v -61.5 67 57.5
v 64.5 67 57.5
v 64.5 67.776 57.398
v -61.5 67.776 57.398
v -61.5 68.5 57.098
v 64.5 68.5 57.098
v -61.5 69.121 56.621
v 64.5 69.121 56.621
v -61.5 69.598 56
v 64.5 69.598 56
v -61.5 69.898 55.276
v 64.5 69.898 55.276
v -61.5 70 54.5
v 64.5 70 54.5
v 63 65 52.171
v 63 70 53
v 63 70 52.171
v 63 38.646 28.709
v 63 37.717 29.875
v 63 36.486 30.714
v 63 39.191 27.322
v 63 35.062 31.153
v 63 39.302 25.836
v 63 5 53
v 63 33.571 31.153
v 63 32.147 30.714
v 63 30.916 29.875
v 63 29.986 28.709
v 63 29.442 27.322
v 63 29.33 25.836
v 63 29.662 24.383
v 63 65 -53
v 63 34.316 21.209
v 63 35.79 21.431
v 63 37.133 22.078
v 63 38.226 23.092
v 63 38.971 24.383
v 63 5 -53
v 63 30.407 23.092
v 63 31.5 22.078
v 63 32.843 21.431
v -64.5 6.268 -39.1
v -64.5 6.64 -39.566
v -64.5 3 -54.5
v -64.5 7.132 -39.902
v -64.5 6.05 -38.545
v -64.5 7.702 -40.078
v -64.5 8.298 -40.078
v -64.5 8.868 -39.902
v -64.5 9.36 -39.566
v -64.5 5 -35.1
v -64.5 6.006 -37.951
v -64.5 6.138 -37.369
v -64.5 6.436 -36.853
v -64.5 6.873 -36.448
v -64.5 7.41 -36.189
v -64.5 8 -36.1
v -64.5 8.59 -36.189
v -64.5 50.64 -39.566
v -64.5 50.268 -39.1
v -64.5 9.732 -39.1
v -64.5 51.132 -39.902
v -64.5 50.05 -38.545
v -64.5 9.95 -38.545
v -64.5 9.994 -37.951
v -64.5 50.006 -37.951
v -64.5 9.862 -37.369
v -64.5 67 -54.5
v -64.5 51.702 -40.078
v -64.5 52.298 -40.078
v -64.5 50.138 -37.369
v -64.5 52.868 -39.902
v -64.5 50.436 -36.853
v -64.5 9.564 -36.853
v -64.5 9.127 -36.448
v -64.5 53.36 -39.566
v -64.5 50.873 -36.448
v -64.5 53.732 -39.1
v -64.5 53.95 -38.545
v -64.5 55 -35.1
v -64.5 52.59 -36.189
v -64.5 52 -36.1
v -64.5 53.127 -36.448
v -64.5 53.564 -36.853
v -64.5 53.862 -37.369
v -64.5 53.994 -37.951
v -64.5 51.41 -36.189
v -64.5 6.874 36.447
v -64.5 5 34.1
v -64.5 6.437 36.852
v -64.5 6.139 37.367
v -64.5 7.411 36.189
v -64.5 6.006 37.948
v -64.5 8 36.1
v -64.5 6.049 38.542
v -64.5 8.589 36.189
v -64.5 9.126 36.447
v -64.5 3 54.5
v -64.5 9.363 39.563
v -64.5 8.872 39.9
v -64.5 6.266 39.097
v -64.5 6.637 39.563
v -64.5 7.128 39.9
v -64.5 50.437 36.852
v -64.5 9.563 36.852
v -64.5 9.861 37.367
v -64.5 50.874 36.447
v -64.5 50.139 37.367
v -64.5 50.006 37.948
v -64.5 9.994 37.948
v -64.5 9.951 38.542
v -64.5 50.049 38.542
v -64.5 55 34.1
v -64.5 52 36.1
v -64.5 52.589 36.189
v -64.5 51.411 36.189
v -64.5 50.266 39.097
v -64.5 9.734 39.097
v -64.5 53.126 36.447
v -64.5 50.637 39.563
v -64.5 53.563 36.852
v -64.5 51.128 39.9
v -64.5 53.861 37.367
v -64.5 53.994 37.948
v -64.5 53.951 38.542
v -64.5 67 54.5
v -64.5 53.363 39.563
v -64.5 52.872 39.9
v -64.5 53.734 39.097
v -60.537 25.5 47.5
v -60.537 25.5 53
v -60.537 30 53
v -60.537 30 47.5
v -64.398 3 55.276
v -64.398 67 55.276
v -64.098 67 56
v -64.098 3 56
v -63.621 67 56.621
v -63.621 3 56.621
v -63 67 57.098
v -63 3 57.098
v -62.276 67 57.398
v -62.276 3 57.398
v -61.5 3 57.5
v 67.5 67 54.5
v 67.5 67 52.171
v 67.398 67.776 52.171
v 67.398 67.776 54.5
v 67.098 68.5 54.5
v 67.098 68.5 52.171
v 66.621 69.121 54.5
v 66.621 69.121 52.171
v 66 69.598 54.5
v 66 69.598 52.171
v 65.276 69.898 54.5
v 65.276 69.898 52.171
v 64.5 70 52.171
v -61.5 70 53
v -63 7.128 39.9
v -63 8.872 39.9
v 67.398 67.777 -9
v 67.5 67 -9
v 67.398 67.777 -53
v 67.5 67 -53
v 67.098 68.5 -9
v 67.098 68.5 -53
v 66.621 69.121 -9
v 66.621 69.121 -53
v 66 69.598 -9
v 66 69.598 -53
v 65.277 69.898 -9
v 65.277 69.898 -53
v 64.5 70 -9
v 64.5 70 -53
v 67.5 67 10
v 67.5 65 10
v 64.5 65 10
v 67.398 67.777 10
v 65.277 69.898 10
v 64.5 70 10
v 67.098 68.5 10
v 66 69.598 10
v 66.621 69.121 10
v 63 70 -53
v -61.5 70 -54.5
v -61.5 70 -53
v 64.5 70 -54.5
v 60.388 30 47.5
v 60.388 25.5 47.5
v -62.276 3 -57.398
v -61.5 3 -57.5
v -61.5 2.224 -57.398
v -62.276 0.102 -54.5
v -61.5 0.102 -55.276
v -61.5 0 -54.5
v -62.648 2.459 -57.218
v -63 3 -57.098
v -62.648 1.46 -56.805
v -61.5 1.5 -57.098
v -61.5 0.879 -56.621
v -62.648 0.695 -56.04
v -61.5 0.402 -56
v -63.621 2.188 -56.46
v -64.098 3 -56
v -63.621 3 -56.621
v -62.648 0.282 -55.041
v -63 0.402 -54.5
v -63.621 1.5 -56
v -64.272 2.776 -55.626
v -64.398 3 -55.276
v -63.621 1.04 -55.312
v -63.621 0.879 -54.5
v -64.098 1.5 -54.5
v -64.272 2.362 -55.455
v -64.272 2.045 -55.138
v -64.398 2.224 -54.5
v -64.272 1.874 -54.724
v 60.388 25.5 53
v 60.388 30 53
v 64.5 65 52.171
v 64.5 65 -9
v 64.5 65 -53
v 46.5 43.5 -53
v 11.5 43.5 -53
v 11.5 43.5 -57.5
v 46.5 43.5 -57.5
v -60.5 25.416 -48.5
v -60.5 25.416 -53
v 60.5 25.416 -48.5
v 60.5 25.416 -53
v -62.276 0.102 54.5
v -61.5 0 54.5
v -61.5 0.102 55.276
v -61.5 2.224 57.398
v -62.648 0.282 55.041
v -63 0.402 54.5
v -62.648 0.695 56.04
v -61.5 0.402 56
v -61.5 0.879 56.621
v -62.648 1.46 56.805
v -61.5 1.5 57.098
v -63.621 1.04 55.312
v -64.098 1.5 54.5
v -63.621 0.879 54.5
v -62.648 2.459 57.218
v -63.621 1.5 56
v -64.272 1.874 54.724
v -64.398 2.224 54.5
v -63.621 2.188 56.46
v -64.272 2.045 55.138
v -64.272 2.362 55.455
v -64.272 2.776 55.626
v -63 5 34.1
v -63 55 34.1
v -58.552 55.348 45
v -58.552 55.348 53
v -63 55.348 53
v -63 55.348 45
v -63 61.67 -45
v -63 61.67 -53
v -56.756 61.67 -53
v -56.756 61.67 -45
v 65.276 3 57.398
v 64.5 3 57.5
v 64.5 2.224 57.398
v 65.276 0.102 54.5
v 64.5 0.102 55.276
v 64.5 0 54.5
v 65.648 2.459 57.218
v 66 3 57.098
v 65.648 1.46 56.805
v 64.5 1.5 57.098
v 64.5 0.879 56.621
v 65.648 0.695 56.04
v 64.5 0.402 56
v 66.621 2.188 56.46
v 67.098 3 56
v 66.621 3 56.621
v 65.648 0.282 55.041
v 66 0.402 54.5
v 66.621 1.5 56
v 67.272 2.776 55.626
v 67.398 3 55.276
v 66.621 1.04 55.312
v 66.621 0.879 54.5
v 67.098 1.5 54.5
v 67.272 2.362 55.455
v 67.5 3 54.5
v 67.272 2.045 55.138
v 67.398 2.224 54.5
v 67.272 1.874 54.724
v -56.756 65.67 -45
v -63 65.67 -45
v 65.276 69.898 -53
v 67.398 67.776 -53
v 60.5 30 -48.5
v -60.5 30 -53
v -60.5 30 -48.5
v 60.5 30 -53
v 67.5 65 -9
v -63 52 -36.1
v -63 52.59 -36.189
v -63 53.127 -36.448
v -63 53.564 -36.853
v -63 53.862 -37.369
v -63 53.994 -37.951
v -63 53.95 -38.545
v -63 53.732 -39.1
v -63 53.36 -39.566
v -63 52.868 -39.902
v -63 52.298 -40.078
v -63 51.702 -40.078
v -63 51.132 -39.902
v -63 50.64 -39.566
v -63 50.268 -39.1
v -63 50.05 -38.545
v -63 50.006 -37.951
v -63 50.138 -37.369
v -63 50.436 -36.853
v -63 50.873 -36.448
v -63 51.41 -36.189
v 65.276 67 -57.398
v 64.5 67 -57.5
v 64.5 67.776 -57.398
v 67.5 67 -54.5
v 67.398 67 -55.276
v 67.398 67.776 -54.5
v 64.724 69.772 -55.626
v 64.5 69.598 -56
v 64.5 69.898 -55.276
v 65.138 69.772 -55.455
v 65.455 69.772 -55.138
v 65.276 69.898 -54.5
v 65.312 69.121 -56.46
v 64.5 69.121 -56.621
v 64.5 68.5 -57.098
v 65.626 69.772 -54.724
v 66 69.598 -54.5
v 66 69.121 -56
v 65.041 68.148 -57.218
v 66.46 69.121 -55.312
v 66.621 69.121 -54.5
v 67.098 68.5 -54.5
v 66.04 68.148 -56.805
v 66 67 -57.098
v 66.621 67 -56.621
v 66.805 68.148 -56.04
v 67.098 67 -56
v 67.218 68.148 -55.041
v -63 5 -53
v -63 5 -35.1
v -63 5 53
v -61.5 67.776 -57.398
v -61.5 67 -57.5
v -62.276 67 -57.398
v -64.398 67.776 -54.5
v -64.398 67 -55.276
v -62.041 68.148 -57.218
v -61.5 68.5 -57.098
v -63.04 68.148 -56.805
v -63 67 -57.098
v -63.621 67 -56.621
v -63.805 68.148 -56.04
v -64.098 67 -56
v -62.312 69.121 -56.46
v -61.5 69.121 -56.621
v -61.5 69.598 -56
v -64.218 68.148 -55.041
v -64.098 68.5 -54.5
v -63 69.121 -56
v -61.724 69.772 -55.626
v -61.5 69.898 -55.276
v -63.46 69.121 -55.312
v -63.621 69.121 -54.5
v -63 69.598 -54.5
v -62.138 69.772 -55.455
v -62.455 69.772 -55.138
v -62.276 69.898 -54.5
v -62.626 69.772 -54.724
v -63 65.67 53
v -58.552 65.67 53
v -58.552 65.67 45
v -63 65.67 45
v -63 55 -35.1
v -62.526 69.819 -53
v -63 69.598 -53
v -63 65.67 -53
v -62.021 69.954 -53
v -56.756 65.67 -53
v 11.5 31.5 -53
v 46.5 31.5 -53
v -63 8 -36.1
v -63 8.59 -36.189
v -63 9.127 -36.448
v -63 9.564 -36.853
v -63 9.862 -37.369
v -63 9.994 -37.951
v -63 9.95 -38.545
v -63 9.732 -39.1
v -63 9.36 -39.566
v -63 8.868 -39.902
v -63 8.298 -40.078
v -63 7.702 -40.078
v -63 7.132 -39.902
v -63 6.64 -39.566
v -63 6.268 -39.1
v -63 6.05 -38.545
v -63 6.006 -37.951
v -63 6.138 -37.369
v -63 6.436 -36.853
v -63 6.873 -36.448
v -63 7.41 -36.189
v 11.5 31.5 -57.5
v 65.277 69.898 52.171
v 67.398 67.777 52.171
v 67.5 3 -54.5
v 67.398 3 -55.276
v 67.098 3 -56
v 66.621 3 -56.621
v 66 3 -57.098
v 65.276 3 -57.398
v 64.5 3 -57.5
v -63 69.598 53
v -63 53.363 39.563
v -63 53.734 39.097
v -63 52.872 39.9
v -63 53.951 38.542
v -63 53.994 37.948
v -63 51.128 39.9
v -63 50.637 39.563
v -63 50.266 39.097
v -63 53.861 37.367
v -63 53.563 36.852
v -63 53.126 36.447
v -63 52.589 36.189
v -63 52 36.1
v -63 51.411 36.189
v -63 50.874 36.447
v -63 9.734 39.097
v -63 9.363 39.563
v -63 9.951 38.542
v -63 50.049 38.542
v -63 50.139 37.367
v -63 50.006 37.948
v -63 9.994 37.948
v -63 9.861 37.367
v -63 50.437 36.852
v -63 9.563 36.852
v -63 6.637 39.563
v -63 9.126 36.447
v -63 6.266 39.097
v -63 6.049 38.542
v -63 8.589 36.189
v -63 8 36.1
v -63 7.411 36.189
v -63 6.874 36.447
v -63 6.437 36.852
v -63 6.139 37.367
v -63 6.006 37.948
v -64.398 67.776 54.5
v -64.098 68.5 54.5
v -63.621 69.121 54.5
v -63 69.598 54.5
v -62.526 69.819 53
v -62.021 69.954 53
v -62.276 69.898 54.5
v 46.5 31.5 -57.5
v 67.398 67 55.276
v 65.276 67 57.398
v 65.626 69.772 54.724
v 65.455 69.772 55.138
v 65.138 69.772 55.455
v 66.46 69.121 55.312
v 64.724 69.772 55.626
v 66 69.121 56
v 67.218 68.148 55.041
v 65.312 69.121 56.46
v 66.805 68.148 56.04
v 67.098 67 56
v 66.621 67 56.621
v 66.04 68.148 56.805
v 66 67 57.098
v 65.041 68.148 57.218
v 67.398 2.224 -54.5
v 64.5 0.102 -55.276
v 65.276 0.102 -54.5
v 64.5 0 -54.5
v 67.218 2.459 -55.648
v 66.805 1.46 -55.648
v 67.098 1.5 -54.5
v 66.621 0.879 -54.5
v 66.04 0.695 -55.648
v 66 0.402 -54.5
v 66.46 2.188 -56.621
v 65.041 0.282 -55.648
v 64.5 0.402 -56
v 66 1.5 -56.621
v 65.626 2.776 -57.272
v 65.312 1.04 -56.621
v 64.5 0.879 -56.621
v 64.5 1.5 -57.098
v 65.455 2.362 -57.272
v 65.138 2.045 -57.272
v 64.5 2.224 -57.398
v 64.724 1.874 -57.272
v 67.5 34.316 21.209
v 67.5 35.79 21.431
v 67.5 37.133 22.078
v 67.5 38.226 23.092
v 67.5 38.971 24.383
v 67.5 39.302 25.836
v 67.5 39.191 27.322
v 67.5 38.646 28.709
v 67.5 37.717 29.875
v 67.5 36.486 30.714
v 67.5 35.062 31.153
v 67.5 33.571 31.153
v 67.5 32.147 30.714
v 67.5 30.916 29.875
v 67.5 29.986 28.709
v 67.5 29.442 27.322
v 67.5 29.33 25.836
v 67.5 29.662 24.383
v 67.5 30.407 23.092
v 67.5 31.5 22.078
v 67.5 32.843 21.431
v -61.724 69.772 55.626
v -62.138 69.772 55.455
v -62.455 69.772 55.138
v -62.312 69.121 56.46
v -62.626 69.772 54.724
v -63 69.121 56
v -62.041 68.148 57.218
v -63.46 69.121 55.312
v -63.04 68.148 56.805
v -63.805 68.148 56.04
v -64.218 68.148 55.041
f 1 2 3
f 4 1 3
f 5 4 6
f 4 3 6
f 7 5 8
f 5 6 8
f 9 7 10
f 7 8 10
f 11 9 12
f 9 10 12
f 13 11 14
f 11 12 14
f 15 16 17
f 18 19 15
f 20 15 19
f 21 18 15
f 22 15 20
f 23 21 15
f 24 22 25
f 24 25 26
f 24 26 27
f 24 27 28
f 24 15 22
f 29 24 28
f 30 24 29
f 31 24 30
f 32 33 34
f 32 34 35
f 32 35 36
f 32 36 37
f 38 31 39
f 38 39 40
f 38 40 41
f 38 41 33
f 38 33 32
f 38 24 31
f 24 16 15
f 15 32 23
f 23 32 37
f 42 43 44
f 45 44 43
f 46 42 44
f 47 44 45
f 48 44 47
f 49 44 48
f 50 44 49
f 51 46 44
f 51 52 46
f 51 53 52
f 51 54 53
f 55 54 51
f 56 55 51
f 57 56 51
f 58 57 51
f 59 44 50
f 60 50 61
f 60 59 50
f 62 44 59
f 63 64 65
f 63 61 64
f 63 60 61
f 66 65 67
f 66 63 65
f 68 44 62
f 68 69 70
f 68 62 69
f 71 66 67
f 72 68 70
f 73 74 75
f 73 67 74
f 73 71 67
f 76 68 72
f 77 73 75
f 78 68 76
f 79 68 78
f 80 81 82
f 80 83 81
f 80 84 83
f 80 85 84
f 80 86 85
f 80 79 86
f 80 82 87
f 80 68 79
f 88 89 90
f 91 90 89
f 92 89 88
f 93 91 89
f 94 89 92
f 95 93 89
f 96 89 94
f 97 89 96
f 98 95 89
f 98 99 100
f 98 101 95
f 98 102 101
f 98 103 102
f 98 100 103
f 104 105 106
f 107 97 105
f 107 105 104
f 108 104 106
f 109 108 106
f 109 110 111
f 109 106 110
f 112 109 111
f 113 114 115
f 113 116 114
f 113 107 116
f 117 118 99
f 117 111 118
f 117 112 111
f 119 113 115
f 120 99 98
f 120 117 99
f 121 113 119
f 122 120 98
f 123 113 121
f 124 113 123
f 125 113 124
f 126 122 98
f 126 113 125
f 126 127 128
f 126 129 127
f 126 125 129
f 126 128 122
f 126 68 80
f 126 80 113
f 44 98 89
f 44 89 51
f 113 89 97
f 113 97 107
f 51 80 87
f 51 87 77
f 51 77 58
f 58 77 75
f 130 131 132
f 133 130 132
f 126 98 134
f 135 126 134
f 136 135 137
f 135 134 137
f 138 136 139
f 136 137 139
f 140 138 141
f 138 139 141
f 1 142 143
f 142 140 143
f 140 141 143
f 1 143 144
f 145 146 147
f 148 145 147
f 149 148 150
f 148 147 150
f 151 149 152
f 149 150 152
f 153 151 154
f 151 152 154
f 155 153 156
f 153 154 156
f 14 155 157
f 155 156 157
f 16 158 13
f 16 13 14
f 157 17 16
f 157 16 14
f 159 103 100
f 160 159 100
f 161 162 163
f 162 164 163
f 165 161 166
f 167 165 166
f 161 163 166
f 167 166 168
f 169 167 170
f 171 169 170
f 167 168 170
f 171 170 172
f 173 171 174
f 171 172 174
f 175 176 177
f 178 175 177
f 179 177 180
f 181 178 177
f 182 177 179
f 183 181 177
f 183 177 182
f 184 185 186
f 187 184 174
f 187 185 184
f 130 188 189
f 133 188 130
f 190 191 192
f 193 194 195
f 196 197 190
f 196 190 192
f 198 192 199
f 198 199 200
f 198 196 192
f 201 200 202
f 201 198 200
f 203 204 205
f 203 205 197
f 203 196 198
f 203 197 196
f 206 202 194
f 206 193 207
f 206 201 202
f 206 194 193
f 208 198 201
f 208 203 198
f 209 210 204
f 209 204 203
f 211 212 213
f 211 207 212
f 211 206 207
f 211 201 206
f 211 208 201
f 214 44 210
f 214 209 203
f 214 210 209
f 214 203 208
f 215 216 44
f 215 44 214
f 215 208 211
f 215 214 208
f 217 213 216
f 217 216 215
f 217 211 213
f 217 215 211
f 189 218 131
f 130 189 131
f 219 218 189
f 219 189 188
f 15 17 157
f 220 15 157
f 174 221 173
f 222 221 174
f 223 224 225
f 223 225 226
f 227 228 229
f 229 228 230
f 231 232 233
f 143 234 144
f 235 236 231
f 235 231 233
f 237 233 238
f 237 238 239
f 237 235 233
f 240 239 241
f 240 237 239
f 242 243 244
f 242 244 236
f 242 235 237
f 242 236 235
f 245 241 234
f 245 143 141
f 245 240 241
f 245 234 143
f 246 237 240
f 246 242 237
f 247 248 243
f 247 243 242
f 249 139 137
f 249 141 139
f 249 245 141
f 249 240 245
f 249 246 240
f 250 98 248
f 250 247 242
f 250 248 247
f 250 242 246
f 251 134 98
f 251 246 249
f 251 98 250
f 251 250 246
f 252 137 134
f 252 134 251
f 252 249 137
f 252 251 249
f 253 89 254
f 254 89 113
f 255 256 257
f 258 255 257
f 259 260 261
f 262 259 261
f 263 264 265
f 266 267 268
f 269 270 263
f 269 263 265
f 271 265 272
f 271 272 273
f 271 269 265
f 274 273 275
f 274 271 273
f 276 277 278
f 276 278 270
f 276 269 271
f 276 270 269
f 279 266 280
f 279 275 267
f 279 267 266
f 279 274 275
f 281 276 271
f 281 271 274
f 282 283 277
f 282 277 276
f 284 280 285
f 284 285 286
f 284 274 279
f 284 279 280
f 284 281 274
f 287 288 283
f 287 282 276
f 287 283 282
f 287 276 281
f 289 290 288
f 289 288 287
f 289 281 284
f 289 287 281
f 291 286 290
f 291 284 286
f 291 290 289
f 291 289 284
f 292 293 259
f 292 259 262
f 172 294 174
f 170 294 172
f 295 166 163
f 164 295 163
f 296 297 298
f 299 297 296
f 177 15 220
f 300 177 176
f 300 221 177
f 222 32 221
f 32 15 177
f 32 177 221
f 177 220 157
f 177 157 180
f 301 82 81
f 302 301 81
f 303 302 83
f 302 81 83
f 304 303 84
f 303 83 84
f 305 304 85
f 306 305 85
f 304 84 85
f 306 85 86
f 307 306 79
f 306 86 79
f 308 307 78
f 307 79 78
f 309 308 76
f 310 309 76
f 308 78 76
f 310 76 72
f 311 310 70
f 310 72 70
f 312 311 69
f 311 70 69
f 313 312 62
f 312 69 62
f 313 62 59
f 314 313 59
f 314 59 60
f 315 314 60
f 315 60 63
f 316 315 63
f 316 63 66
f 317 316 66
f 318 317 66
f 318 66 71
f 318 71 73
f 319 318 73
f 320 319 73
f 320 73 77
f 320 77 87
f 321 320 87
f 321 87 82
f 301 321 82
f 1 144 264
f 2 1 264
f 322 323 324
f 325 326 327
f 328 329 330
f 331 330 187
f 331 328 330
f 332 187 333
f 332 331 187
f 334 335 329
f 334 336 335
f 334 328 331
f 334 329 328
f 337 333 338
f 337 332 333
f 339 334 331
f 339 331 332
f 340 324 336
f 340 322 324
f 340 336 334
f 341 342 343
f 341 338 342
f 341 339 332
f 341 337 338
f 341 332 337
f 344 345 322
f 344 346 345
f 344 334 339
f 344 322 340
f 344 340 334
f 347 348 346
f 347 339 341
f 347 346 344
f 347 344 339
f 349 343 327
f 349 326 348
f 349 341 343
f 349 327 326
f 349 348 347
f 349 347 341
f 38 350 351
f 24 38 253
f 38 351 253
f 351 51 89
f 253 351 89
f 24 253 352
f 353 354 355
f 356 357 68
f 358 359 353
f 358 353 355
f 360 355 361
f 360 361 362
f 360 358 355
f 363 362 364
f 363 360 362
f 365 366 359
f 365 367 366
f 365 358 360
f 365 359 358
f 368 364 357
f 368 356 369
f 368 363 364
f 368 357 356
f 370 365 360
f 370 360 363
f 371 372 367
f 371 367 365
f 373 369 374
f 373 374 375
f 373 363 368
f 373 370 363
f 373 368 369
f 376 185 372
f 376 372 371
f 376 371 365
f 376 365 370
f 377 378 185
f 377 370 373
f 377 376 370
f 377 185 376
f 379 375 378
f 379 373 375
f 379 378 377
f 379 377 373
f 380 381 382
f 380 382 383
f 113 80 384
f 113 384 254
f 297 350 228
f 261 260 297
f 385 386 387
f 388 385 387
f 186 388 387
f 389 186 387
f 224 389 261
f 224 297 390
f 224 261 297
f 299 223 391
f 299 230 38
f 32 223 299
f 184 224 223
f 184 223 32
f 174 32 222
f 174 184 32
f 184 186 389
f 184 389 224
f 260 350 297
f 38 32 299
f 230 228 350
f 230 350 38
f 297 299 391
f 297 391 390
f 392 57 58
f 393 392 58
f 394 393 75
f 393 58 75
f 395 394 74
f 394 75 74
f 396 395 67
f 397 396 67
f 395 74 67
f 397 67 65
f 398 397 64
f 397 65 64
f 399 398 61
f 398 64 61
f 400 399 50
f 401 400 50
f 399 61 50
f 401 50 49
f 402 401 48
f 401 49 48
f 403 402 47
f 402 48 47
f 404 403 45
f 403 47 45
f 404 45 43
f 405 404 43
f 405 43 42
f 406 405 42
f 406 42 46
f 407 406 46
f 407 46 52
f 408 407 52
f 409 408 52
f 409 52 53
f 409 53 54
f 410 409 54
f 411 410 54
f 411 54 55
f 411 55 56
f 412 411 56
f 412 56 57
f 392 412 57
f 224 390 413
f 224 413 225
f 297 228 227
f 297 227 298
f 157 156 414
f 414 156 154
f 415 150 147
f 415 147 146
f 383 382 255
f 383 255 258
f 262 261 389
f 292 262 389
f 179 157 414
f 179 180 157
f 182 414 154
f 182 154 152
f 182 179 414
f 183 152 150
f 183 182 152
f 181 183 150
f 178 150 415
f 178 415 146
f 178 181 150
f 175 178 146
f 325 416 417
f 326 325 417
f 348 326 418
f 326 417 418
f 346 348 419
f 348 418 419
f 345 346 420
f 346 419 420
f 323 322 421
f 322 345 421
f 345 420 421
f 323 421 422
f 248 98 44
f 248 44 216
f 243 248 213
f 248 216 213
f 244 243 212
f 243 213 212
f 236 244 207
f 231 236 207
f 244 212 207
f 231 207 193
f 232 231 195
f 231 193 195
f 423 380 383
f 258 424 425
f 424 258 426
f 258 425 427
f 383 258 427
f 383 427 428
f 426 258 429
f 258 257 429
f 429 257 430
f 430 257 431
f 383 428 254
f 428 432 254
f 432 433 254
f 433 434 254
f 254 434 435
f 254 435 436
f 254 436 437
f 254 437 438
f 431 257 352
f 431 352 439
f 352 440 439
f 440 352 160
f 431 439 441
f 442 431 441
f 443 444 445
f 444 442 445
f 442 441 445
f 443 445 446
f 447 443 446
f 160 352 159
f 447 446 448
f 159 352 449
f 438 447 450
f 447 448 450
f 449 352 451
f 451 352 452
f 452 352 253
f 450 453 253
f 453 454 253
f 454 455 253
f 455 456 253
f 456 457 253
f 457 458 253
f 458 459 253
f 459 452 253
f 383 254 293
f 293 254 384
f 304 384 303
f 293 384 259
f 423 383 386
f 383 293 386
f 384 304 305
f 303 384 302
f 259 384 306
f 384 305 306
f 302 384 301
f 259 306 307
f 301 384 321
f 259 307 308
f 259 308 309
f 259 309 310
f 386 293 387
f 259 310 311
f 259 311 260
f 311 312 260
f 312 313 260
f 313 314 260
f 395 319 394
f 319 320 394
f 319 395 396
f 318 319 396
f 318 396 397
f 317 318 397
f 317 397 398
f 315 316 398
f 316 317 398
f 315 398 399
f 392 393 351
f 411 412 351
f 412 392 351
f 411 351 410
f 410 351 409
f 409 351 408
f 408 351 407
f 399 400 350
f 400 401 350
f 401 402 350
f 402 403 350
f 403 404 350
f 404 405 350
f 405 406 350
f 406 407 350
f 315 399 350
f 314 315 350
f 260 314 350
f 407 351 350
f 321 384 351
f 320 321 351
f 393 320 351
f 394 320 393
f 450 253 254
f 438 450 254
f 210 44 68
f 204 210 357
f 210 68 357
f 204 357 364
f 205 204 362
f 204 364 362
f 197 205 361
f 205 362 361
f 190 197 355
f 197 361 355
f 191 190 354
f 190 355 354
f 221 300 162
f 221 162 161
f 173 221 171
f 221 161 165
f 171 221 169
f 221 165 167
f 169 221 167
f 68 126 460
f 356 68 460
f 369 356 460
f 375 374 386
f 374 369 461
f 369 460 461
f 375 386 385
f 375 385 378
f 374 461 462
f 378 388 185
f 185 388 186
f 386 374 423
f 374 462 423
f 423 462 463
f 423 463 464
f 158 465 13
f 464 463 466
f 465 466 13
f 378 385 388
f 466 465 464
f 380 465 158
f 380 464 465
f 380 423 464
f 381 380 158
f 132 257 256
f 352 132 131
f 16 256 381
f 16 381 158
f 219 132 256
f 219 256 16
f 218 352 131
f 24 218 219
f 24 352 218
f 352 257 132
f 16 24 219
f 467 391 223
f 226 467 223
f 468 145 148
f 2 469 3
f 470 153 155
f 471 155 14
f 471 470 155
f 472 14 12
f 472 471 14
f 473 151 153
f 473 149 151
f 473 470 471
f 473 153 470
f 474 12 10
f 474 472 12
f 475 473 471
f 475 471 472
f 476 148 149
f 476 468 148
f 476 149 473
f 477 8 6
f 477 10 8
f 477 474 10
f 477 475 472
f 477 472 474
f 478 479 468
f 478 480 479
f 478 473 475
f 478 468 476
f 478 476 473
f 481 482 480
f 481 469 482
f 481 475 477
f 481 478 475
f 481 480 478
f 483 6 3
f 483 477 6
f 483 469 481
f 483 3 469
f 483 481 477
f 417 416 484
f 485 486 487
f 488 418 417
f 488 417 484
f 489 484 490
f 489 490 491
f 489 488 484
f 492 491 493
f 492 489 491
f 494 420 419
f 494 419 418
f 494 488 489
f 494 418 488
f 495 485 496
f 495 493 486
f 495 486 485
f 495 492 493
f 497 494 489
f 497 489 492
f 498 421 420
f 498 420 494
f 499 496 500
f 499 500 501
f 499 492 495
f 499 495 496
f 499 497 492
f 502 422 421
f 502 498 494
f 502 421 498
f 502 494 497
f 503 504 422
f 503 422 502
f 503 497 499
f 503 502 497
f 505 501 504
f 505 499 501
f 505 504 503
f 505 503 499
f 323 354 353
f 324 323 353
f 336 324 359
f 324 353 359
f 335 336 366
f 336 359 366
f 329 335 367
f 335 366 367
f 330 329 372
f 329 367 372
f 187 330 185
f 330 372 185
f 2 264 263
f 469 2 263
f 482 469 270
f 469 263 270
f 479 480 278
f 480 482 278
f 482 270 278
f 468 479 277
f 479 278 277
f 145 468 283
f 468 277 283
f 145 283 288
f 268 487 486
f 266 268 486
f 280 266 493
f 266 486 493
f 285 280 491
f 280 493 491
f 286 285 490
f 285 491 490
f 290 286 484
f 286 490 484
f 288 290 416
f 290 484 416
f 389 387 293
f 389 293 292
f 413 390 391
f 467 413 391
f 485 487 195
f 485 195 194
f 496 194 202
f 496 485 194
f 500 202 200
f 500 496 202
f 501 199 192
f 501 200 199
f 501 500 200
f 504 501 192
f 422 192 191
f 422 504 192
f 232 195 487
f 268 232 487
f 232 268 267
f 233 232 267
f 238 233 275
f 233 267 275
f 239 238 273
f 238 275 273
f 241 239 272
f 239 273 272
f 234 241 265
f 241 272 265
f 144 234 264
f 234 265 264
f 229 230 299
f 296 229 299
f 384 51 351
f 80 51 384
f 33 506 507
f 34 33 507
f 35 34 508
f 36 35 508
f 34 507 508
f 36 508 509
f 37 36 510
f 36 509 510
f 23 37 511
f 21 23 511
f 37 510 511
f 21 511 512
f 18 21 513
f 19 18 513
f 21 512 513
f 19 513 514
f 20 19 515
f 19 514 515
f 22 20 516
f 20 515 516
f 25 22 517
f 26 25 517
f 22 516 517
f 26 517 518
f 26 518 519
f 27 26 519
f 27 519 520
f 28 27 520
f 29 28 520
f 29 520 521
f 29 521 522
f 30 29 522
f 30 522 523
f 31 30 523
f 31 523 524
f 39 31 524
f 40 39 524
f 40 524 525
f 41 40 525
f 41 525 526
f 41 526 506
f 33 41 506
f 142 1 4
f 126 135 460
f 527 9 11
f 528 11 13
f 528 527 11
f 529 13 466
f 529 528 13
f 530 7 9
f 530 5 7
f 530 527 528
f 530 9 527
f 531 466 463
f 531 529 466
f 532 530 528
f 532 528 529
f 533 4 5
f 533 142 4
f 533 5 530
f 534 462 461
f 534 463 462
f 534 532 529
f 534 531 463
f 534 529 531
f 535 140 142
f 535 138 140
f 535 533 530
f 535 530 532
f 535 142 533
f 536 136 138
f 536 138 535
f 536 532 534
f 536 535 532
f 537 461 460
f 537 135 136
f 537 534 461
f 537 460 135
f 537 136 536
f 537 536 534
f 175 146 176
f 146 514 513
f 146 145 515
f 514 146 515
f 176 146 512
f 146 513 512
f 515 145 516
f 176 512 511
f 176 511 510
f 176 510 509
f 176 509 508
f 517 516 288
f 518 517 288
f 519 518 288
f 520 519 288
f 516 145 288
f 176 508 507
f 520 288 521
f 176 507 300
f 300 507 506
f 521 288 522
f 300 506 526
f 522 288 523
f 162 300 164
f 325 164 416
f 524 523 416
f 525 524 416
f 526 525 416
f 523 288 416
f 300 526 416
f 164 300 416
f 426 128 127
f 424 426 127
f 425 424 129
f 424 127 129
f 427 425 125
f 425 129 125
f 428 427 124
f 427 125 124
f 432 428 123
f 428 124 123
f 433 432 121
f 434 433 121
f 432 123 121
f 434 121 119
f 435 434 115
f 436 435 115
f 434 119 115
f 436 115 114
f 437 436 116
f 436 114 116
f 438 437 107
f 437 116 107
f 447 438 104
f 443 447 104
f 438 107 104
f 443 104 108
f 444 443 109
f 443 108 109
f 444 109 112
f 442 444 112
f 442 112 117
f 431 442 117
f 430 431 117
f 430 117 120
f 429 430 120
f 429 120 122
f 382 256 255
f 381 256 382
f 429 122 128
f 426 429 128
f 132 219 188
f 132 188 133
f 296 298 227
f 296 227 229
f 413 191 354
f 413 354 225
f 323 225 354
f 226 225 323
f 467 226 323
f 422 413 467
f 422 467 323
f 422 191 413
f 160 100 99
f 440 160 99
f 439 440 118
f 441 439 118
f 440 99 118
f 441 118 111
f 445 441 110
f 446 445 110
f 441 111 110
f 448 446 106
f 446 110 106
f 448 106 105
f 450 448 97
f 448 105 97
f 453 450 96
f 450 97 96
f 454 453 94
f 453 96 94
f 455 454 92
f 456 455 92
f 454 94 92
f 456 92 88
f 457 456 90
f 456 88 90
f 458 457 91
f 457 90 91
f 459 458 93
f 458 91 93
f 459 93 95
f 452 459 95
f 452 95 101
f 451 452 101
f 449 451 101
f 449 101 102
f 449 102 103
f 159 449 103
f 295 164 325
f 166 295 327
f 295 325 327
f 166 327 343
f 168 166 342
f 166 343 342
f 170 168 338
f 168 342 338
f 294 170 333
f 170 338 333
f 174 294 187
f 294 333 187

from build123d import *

# Parameters (mm, degrees)
SKETCH2_W           = 135
SKETCH2_H           = 115
SKETCH2_W_2         = 126
SKETCH2_H_2         = 106
BOSS_EXTRUDE1_DEPTH = 70
SKETCH2_2_W         = 126
SKETCH2_2_H         = 106
BOSS_EXTRUDE2_DEPTH = 5
SKETCH3_W           = 121
SKETCH3_H           = 4.584314329
BOSS_EXTRUDE3_DEPTH = 4.5
SKETCH3_3_W         = 35
SKETCH3_3_H         = 12
CUT_EXTRUDE1_DEPTH  = 148.195448299
SKETCH11_W          = 69.2
SKETCH11_H          = 50
SKETCH11_R          = 2
CUT_EXTRUDE3_DEPTH  = 26.5
SKETCH21_R          = 5
CUT_EXTRUDE7_DEPTH  = 10
SKETCH12_W          = 4.5
SKETCH12_H          = 105.171400209
CUT_EXTRUDE4_DEPTH  = 5
SKETCH15_W          = 115
SKETCH15_H          = 70
CUT_EXTRUDE6_DEPTH  = 3
SKETCH17_W          = 120.925170316
SKETCH17_H          = 4.5
BOSS_EXTRUDE5_DEPTH = 5.5
FILLET1_R           = 3
FILLET2_R           = 3
FILLET3_R           = 3
SKETCH22_W          = 3
SKETCH22_H          = 105.171400209
BOSS_EXTRUDE8_DEPTH = 5
SKETCH14_W          = 19
SKETCH14_H          = 5
CUT_EXTRUDE5_DEPTH  = 5
SKETCH19_W          = 6.24417403
SKETCH19_H          = 4
BOSS_EXTRUDE6_DEPTH = 8
SKETCH20_W          = 4.447751713
SKETCH20_H          = 10.321902288
BOSS_EXTRUDE7_DEPTH = 8
FILLET5_R           = 3
FILLET6_R           = 3


# Some blends are built 0.0001 mm under size
with BuildPart() as part:
    # Sketch2 → Boss-Extrude1 (new body)
    with BuildSketch(Plane(origin=(0, 0, 0), x_dir=(1, 0, 0), z_dir=(0, 1, 0))):
        Rectangle(SKETCH2_W, SKETCH2_H)
        Rectangle(SKETCH2_W_2, SKETCH2_H_2, mode=Mode.SUBTRACT)
    extrude(amount=BOSS_EXTRUDE1_DEPTH)

    # Sketch2<2> → Boss-Extrude2 (add)
    with BuildSketch(Plane(origin=(0, 0, 0), x_dir=(1, 0, 0), z_dir=(0, 1, 0))):
        Rectangle(SKETCH2_2_W, SKETCH2_2_H)
    extrude(amount=BOSS_EXTRUDE2_DEPTH)

    # Sketch3 → Boss-Extrude3 (add)
    with BuildSketch(Plane.XY.offset(-53)):
        with Locations((0, 27.707842836)):
            Rectangle(SKETCH3_W, SKETCH3_H)
    extrude(amount=BOSS_EXTRUDE3_DEPTH)

    # Sketch3<3> → Cut-Extrude1 (cut, through all)
    with BuildSketch(Plane.XY.offset(-53)):
        with Locations((29, 37.5)):
            Rectangle(SKETCH3_3_W, SKETCH3_3_H)
    extrude(amount=-CUT_EXTRUDE1_DEPTH, mode=Mode.SUBTRACT)

    # Sketch11 → Cut-Extrude3 (cut)
    with BuildSketch(Plane.ZY.offset(67.5)):
        with Locations((-0.5, 30)):
            Rectangle(SKETCH11_W, SKETCH11_H)
        with BuildLine():
            ThreePointArc((39.9, 8.871779789), (36.1, 8), (39.9, 7.128220211))
            Line((39.9, 7.128220211), (39.9, 8.871779789))
        make_face()
        with BuildLine():
            Line((39.9, 51.128220211), (39.9, 52.871779789))
            ThreePointArc((39.9, 52.871779789), (36.1, 52), (39.9, 51.128220211))
        make_face()
        with Locations((-38.1, 52)):
            Circle(SKETCH11_R)
        with Locations((-38.1, 8)):
            Circle(SKETCH11_R)
    extrude(amount=-CUT_EXTRUDE3_DEPTH, mode=Mode.SUBTRACT)

    # Sketch21 → Cut-Extrude7 (cut)
    with BuildSketch(Plane(origin=(67.5, 0, 0), x_dir=(0, 0, -1), z_dir=(1, 0, 0))):
        with Locations((-26.20929228, 34.316365245)):
            Circle(SKETCH21_R)
    extrude(amount=-CUT_EXTRUDE7_DEPTH, mode=Mode.SUBTRACT)

    # Sketch12 → Cut-Extrude4 (cut)
    with BuildSketch(Plane(origin=(0, 70, 0), x_dir=(1, 0, 0), z_dir=(0, 1, 0))):
        with Locations((65.25, 0.414299895)):
            Rectangle(SKETCH12_W, SKETCH12_H)
    extrude(amount=-CUT_EXTRUDE4_DEPTH, mode=Mode.SUBTRACT)

    # Sketch15 → Cut-Extrude6 (cut)
    with BuildSketch(Plane.ZY.offset(67.5)):
        with Locations((0, 35)):
            Rectangle(SKETCH15_W, SKETCH15_H)
    extrude(amount=-CUT_EXTRUDE6_DEPTH, mode=Mode.SUBTRACT)

    # Sketch17 → Boss-Extrude5 (add)
    with BuildSketch(Plane(origin=(0, 0, 53), x_dir=(-1, 0, 0), z_dir=(0, 0, -1))):
        with Locations((0.074904723, 27.75)):
            Rectangle(SKETCH17_W, SKETCH17_H)
    extrude(amount=BOSS_EXTRUDE5_DEPTH)

    # Fillet1
    fillet1_edges = [part.edges().sort_by_distance(p)[0] for p in [
        (1.5, 0, 57.5),
        (1.5, 0, -57.5),
        (67.5, 0, 0),
    ]]
    fillet(fillet1_edges, radius=FILLET1_R)

    # Fillet2
    # the kernel refuses this fillet: 3 mm, written as the material it takes off along each edge
    with BuildSketch(Plane(origin=(64.5, 3, 54.5), x_dir=(0, 0, 1), z_dir=(1, 0, 0))) as fillet2_piece_1_section:
        Polygon((0, 0), (FILLET2_R, 0), (FILLET2_R, FILLET2_R), (0, FILLET2_R), align=None)
    fillet2_piece_1 = extrude(amount=FILLET2_R, mode=Mode.PRIVATE)
    fillet2_piece_1 = fillet2_piece_1 - Plane(origin=(64.5, 3, 54.5), x_dir=(0, 0.7071067811865475, -0.7071067811865475), z_dir=(1, 0, 0)) * Sphere(FILLET2_R, mode=Mode.PRIVATE)
    add(fillet2_piece_1, mode=Mode.SUBTRACT)
    with BuildSketch(Plane(origin=(64.5, 3, -54.5), x_dir=(1, 0, 0), z_dir=(0, 0, -1))) as fillet2_piece_2_section:
        Polygon((0, 0), (FILLET2_R, 0), (FILLET2_R, FILLET2_R), (0, FILLET2_R), align=None)
    fillet2_piece_2 = extrude(amount=FILLET2_R, mode=Mode.PRIVATE)
    fillet2_piece_2 = fillet2_piece_2 - Plane(origin=(64.5, 3, -54.5), x_dir=(-0.7071067811865475, 0.7071067811865475, 0), z_dir=(0, 0, -1)) * Sphere(FILLET2_R, mode=Mode.PRIVATE)
    add(fillet2_piece_2, mode=Mode.SUBTRACT)
    with BuildSketch(Plane(origin=(-64.5, 77.5, -57.5), x_dir=(1, 0, 0), z_dir=(0, -1, 0)), Plane(origin=(67.5, 3, 57.5), x_dir=(0, 0, -1), z_dir=(0, 1, 0)), Plane(origin=(67.5, 3, -57.5), x_dir=(-1, 0, 0), z_dir=(0, 1, 0))) as fillet2_piece_3:
        with BuildLine():
            CenterArc((FILLET2_R, FILLET2_R), FILLET2_R, 180, 90)
            Line((0, FILLET2_R), (0, 0))
            Line((0, 0), (FILLET2_R, 0))
        make_face()
    extrude(amount=74.5, mode=Mode.SUBTRACT)
    with BuildSketch(Plane(origin=(-64.5, 0, -54.5), x_dir=(0, 1, 0), z_dir=(0, 0, 1))) as fillet2_piece_4:
        with BuildLine():
            CenterArc((FILLET2_R, -FILLET2_R), FILLET2_R, 90, 90)
            Line((0, -FILLET2_R), (0, 0))
            Line((0, 0), (FILLET2_R, 0))
        make_face()
    extrude(amount=109, mode=Mode.SUBTRACT)
    with BuildSketch(Plane(origin=(-64.5, 3, 57.5), x_dir=(0, 0, -1), z_dir=(0, 1, 0))) as fillet2_piece_5:
        with BuildLine():
            CenterArc((FILLET2_R, -FILLET2_R), FILLET2_R, 90, 90)
            Line((0, -FILLET2_R), (0, 0))
            Line((0, 0), (FILLET2_R, 0))
        make_face()
    extrude(amount=74.5, mode=Mode.SUBTRACT)
    with BuildSketch(Plane(origin=(-64.5, 3, -54.5), x_dir=(0, 0, -1), z_dir=(0, 1, 0))) as fillet2_piece_6:
        with BuildLine():
            CenterArc((3 - FILLET2_R, -FILLET2_R), FILLET2_R, 0, 90)
            Line((3 - FILLET2_R, 0), (3, 0))
            Line((3, 0), (3, -FILLET2_R))
        make_face()
    revolve(axis=Axis((-64.5, 3, -54.5), (-1, 0, 0)), revolution_arc=90, mode=Mode.SUBTRACT)
    with BuildSketch(Plane(origin=(-64.5, 3, 54.5), x_dir=(0, -1, 0), z_dir=(0, 0, -1))) as fillet2_piece_7:
        with BuildLine():
            CenterArc((3 - FILLET2_R, -FILLET2_R), FILLET2_R, 360, 90)
            Line((3, -FILLET2_R), (3, 0))
            Line((3, 0), (3 - FILLET2_R, 0))
        make_face()
    revolve(axis=Axis((-64.5, 3, 54.5), (-1, 0, 0)), revolution_arc=90, mode=Mode.SUBTRACT)

    # Fillet3
    # the kernel refuses this fillet: 3 mm, written as the material it takes off along each edge
    with BuildSketch(Plane(origin=(67.5, 70, -54.5), x_dir=(-1, 0, 0), z_dir=(0, 0, 1))) as fillet3_piece_1:
        with BuildLine():
            CenterArc((FILLET3_R, FILLET3_R), FILLET3_R, 180, 90)
            Line((0, FILLET3_R), (0, 0))
            Line((0, 0), (FILLET3_R, 0))
        make_face()
    extrude(amount=9, mode=Mode.SUBTRACT)
    with BuildSketch(Plane(origin=(64.5, 70, -54.5), x_dir=(0, 0, -1), z_dir=(-1, 0, 0))) as fillet3_piece_2:
        with BuildLine():
            CenterArc((3 - FILLET3_R, FILLET3_R), FILLET3_R, 270, 90)
            Line((3 - FILLET3_R, 0), (3, 0))
            Line((3, 0), (3, FILLET3_R))
        make_face()
    revolve(axis=Axis((64.5, 70, -54.5), (0, -1, 0)), revolution_arc=90, mode=Mode.SUBTRACT)
    with BuildSketch(Plane(origin=(-61.5, 70, -57.5), x_dir=(0, -1, 0), z_dir=(1, 0, 0))) as fillet3_piece_3:
        with BuildLine():
            CenterArc((FILLET3_R, -FILLET3_R), FILLET3_R, 90, 90)
            Line((0, -FILLET3_R), (0, 0))
            Line((0, 0), (FILLET3_R, 0))
        make_face()
    extrude(amount=126, mode=Mode.SUBTRACT)
    with BuildSketch(Plane(origin=(-61.5, 70, -54.5), x_dir=(0, 0, -1), z_dir=(1, 0, 0))) as fillet3_piece_4:
        with BuildLine():
            CenterArc((3 - FILLET3_R, -FILLET3_R), FILLET3_R, 0, 90)
            Line((3, -FILLET3_R), (3, 0))
            Line((3, 0), (3 - FILLET3_R, 0))
        make_face()
    revolve(axis=Axis((-61.5, 70, -54.5), (0, 1, 0)), revolution_arc=90, mode=Mode.SUBTRACT)
    with BuildSketch(Plane(origin=(-64.5, 70, 54.5), x_dir=(1, 0, 0), z_dir=(0, 0, -1))) as fillet3_piece_5:
        with BuildLine():
            CenterArc((FILLET3_R, FILLET3_R), FILLET3_R, 180, 90)
            Line((0, FILLET3_R), (0, 0))
            Line((0, 0), (FILLET3_R, 0))
        make_face()
    extrude(amount=109, mode=Mode.SUBTRACT)
    with BuildSketch(Plane(origin=(-61.5, 70, 54.5), x_dir=(0, 0, 1), z_dir=(1, 0, 0))) as fillet3_piece_6:
        with BuildLine():
            CenterArc((3 - FILLET3_R, FILLET3_R), FILLET3_R, 270, 90)
            Line((3, FILLET3_R), (3, 0))
            Line((3, 0), (3 - FILLET3_R, 0))
        make_face()
    revolve(axis=Axis((-61.5, 70, 54.5), (0, -1, 0)), revolution_arc=90, mode=Mode.SUBTRACT)
    with BuildSketch(Plane(origin=(64.5, 70, 57.5), x_dir=(0, 0, -1), z_dir=(-1, 0, 0))) as fillet3_piece_7:
        with BuildLine():
            CenterArc((FILLET3_R, FILLET3_R), FILLET3_R, 180, 90)
            Line((0, FILLET3_R), (0, 0))
            Line((0, 0), (FILLET3_R, 0))
        make_face()
    extrude(amount=126, mode=Mode.SUBTRACT)
    with BuildSketch(Plane(origin=(64.5, 70, 54.5), x_dir=(1, 0, 0), z_dir=(0, 0, -1))) as fillet3_piece_8:
        with BuildLine():
            CenterArc((3 - FILLET3_R, FILLET3_R), FILLET3_R, 270, 90)
            Line((3, FILLET3_R), (3, 0))
            Line((3, 0), (3 - FILLET3_R, 0))
        make_face()
    revolve(axis=Axis((64.5, 70, 54.5), (0, -1, 0)), revolution_arc=90, mode=Mode.SUBTRACT)
    with BuildSketch(Plane(origin=(67.5, 70, 44.671400209), x_dir=(-1, 0, 0), z_dir=(0, 0, 1))) as fillet3_piece_9:
        with BuildLine():
            CenterArc((FILLET3_R, FILLET3_R), FILLET3_R, 180, 90)
            Line((0, FILLET3_R), (0, 0))
            Line((0, 0), (FILLET3_R, 0))
        make_face()
    extrude(amount=9.828599791, mode=Mode.SUBTRACT)

    # Sketch22 → Boss-Extrude8 (add)
    with BuildSketch(Plane(origin=(0, 65, 0), x_dir=(1, 0, 0), z_dir=(0, 1, 0))):
        with Locations((66, 0.414299895)):
            Rectangle(SKETCH22_W, SKETCH22_H)
    extrude(amount=BOSS_EXTRUDE8_DEPTH)

    # Sketch14 → Cut-Extrude5 (cut)
    with BuildSketch(Plane(origin=(67.5, 0, 0), x_dir=(0, 0, -1), z_dir=(1, 0, 0))):
        with Locations((-0.5, 67.5)):
            Rectangle(SKETCH14_W, SKETCH14_H)
    extrude(amount=-CUT_EXTRUDE5_DEPTH, mode=Mode.SUBTRACT)

    # Sketch19 → Boss-Extrude6 (add)
    with BuildSketch(Plane.XY.offset(-53)):
        with Locations((-59.877912985, 63.669872981)):
            Rectangle(SKETCH19_W, SKETCH19_H)
    extrude(amount=BOSS_EXTRUDE6_DEPTH)

    # Sketch20 → Boss-Extrude7 (add)
    with BuildSketch(Plane(origin=(0, 0, 53), x_dir=(-1, 0, 0), z_dir=(0, 0, -1))):
        with Locations((60.776124144, 60.508921837)):
            Rectangle(SKETCH20_W, SKETCH20_H)
    extrude(amount=BOSS_EXTRUDE7_DEPTH)

    # Fillet5
    fillet5_edges = [part.edges().sort_by_distance(p)[0] for p in [
        (67.5, 70, 31.085700105),
    ]]
    fillet(fillet5_edges, radius=FILLET5_R - 0.0001)  # a hair under: the kernel refuses the full size

    # Fillet6
    fillet6_edges = [part.edges().sort_by_distance(p)[0] for p in [
        (67.5, 70, -31),
    ]]
    fillet(fillet6_edges, radius=FILLET6_R - 0.0001)  # a hair under: the kernel refuses the full size


solid = part.part
